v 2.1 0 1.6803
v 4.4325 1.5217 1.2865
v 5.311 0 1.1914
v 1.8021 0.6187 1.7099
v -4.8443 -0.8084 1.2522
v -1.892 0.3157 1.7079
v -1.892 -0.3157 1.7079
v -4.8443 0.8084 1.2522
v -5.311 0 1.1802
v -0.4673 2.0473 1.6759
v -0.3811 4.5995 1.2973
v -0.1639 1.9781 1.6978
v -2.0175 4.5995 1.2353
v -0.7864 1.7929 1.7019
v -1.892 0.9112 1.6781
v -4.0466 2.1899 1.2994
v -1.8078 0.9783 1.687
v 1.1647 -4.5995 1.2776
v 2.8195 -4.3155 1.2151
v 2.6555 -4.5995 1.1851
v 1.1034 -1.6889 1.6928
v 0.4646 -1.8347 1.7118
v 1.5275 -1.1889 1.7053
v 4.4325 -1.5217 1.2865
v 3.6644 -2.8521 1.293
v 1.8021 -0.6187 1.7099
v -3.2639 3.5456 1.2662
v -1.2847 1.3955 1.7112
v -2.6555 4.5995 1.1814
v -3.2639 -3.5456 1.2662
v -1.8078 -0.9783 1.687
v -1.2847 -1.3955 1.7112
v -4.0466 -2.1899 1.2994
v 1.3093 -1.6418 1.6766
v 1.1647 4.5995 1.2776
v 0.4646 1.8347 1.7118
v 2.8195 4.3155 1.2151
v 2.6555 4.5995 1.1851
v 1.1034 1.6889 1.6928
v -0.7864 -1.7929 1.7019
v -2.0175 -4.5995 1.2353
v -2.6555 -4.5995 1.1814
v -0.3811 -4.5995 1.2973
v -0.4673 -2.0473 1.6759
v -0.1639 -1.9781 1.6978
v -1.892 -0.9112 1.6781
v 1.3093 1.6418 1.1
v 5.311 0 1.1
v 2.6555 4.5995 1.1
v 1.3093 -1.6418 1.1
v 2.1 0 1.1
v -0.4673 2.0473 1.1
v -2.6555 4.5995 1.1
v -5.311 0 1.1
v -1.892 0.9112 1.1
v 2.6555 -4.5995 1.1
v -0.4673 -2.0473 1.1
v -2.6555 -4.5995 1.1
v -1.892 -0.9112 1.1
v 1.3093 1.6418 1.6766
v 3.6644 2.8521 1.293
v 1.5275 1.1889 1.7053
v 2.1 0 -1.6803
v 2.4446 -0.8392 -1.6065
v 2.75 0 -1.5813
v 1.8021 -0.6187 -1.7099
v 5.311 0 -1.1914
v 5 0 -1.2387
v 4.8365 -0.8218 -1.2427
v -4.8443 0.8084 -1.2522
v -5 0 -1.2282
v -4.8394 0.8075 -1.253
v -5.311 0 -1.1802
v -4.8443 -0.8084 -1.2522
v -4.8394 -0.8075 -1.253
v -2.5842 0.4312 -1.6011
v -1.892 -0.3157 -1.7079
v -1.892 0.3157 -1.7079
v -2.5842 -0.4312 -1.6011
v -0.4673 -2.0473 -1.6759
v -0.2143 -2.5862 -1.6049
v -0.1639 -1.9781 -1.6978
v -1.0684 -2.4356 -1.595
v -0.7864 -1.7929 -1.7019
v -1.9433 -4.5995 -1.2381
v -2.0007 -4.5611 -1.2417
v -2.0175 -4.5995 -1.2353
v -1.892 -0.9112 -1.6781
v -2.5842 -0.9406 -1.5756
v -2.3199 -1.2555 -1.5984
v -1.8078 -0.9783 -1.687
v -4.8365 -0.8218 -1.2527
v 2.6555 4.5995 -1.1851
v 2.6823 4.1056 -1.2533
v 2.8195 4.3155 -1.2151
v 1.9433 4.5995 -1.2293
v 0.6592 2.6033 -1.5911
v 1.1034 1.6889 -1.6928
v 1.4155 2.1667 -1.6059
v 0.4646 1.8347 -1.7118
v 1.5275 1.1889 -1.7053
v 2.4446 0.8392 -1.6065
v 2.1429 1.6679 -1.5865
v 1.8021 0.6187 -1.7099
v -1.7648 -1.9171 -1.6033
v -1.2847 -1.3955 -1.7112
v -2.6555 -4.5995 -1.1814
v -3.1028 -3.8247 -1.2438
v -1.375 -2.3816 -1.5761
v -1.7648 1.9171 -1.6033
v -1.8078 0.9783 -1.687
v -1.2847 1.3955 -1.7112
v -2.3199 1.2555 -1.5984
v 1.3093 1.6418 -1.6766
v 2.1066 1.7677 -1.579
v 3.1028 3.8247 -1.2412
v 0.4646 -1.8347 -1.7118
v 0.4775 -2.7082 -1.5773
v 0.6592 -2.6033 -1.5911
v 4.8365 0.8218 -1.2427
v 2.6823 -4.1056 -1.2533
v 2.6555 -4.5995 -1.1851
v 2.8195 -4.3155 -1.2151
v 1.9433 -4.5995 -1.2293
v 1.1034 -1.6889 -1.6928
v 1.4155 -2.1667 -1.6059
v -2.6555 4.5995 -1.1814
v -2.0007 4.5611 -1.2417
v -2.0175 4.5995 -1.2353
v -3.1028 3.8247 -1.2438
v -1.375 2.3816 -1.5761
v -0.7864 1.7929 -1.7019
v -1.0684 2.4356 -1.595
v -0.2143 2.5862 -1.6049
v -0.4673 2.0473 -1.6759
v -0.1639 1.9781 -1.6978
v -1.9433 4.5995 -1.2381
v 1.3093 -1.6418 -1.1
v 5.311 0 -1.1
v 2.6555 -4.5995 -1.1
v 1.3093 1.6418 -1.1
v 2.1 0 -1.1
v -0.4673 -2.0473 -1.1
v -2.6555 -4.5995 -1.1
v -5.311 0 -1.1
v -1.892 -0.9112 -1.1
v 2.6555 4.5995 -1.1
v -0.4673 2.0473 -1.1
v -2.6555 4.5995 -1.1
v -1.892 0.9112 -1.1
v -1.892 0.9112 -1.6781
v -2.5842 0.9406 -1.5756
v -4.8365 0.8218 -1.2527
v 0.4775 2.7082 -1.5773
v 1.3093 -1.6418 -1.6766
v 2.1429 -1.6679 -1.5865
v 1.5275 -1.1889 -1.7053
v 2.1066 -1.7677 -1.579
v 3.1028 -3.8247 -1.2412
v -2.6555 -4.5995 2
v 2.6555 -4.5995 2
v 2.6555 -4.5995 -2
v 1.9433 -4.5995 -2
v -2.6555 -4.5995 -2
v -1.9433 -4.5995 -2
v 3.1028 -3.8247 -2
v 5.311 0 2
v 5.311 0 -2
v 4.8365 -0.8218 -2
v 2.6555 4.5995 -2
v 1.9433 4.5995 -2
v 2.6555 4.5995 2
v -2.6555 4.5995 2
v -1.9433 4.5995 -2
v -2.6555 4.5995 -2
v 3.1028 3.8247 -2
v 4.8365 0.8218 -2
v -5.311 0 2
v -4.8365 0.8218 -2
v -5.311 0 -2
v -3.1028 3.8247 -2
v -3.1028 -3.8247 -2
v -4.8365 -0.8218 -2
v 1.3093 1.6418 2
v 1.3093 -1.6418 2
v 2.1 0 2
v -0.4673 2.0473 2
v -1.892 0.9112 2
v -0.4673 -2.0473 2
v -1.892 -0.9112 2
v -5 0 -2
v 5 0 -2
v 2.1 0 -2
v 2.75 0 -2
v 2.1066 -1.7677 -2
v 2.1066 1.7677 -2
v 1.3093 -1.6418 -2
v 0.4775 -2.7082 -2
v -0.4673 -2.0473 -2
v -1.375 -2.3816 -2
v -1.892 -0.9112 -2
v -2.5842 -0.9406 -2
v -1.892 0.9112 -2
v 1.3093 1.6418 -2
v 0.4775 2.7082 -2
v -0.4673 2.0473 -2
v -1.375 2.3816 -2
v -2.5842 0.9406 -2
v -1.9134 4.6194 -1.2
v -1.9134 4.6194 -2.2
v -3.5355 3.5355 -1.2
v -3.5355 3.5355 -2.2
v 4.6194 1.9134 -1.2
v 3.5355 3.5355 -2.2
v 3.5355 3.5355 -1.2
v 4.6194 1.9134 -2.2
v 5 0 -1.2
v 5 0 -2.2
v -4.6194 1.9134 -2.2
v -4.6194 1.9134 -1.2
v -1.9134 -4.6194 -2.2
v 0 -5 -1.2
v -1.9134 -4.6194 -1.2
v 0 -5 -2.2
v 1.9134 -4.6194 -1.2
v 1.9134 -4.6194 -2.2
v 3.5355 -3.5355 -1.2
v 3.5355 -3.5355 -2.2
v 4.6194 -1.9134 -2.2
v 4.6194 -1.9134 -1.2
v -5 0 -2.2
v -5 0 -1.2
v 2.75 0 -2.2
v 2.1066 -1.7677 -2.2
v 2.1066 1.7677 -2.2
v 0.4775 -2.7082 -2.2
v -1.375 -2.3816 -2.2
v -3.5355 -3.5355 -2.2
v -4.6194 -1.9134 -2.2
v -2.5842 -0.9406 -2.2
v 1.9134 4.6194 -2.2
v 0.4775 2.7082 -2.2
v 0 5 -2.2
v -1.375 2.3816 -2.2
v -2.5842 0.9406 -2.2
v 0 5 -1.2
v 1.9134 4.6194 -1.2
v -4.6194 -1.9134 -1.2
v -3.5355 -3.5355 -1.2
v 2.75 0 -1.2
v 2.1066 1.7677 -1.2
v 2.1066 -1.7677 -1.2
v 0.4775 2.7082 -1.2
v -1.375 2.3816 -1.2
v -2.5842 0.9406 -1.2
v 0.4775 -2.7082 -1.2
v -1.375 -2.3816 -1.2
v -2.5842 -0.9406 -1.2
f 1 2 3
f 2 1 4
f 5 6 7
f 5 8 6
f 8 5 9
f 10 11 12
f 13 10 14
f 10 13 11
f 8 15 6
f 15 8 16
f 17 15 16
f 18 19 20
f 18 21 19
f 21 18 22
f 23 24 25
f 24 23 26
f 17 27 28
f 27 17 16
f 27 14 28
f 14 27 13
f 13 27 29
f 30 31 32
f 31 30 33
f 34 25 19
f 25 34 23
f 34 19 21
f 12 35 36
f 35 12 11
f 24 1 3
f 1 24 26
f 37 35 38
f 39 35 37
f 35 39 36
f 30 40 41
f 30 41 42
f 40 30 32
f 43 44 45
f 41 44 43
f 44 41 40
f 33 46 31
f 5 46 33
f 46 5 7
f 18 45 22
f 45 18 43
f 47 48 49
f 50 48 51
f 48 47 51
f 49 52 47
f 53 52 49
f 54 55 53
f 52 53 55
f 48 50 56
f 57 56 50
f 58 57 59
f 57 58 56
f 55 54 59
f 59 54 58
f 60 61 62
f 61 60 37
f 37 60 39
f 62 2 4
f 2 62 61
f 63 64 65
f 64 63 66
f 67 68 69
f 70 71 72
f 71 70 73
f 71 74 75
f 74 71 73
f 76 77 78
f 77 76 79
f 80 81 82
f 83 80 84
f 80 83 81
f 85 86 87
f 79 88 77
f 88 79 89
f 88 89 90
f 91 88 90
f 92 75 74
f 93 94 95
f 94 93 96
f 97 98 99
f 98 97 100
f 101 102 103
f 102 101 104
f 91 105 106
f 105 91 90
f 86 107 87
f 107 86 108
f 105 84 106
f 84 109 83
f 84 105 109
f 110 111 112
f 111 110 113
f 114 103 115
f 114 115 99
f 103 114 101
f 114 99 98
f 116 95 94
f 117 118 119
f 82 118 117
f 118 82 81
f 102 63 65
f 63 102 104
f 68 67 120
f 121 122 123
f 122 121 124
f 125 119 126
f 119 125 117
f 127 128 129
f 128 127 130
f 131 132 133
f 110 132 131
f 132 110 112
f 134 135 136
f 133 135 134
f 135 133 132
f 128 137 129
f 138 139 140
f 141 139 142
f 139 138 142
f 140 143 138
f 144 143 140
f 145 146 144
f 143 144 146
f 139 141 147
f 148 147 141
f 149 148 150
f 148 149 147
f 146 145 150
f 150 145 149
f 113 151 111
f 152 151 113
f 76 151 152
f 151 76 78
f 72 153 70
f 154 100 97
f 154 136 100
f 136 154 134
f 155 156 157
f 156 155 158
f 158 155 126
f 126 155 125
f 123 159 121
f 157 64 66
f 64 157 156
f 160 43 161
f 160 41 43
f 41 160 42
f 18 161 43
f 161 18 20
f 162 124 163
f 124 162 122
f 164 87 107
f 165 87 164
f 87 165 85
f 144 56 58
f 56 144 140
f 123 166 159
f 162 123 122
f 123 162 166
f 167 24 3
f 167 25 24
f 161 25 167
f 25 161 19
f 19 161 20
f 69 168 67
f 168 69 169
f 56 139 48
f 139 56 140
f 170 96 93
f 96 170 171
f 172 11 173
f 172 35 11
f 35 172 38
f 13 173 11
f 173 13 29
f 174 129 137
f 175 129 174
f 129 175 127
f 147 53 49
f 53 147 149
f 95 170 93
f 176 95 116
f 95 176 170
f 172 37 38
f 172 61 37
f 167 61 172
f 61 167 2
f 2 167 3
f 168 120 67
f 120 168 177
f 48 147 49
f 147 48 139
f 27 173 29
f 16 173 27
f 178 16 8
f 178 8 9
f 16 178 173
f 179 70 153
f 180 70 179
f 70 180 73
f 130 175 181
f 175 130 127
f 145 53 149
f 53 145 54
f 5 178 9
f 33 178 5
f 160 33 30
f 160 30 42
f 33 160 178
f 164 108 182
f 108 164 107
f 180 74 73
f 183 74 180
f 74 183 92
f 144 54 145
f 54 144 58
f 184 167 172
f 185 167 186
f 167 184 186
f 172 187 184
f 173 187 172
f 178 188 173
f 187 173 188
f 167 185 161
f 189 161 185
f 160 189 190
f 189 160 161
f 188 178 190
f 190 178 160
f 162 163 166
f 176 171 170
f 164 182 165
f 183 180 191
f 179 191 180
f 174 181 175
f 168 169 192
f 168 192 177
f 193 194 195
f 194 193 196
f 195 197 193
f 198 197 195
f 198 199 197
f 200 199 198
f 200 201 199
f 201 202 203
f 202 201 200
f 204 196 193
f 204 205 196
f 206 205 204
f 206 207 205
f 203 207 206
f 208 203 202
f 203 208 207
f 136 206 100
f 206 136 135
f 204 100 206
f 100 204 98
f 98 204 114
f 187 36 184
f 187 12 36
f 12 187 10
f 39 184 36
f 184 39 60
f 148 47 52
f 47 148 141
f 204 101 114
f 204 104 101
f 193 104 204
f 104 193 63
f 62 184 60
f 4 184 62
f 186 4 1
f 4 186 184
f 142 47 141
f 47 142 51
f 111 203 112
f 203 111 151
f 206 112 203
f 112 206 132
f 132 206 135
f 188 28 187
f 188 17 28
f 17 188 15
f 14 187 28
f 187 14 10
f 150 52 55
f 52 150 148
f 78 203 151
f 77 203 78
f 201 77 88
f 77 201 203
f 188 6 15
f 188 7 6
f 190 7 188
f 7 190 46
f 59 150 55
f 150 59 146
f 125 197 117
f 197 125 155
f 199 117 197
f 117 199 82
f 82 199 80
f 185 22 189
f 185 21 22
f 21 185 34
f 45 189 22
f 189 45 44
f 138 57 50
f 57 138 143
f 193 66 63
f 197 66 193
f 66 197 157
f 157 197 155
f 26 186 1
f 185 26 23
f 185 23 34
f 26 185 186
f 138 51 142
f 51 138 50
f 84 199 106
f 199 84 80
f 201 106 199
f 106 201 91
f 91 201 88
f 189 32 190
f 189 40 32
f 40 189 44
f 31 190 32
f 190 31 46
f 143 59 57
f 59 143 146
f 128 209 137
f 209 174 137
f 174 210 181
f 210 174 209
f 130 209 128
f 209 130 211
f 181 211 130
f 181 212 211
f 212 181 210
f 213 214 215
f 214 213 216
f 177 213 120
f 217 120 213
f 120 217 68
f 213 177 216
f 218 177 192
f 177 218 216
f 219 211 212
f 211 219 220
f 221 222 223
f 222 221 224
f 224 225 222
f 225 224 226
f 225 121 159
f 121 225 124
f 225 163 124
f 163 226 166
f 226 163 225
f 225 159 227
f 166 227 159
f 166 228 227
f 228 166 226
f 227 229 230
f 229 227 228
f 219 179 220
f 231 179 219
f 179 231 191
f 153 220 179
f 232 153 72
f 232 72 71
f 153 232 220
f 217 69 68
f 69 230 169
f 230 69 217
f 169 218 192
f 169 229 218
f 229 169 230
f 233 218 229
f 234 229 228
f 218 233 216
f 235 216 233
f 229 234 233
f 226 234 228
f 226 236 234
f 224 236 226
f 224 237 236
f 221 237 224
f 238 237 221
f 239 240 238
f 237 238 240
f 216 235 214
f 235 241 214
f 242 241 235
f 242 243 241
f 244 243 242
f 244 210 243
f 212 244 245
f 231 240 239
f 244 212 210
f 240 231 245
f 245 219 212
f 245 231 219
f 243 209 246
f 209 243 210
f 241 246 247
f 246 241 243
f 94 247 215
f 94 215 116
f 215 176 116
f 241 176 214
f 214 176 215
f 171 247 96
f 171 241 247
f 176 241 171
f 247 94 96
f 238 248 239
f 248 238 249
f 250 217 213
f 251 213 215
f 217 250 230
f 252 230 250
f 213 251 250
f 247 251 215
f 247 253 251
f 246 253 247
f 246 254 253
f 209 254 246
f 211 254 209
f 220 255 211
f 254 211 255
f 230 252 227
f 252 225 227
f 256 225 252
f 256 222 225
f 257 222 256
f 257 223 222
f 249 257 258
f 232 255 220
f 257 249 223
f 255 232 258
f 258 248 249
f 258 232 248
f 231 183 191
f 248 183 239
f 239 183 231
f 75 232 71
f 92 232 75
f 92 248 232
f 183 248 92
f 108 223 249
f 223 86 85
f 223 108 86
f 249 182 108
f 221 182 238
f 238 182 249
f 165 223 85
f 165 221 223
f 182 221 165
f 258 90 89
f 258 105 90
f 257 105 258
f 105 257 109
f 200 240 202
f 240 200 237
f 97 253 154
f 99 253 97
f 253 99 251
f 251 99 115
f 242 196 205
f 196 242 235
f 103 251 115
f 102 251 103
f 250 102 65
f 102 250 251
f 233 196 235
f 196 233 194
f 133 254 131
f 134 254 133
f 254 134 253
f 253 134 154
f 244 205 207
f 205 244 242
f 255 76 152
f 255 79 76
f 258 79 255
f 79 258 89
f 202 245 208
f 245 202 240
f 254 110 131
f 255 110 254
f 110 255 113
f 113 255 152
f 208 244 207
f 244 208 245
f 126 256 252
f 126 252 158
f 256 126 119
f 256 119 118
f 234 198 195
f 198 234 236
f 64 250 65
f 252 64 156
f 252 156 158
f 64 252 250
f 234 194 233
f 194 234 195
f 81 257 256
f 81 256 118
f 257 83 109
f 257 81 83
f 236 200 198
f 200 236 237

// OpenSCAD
// Parameters
thread_nominal_diameter_mm = 5; //[2.5:10:0.1]
across_flats_mm = 9.2; //[4.6:18.4:0.1]
thickness_mm = 4; //[2:8:0.1]
hole_minor_diameter_mm = 4.2; //[2.1:8.4:0.05]
hole_clearance_diameter_mm = 5.5; //[5:7:0.05]
hole_type = 0; //[0:1:1]
thread_pitch_mm = 0.8; //[0.4:1.6:0.05]
chamfer_mm = 0.3; //[0:1:0.05]
corner_radius_mm = 0; //[0:1:0.05]
eps_mm = 0.6; //[0.2:1.5:0.1]
hex_outer_radius_mm = 5.311; //[2.6555:10.622:0.001]
hole_diameter_mm = 4.2; //[2:7:0.05]
washer_outer_diameter_mm = 10; //[6:20:0.1]
washer_thickness_mm = 1; //[0.5:2:0.1]
washer_hole_diameter_mm = 5.5; //[5:7:0.05]
washer_overlap_mm = 0.8; //[0.3:2:0.1]

// M5 Nut - complete geometry
module nut() {
  color("DimGray") {
    difference() {
      // Hex nut body
      cylinder(r=hex_outer_radius_mm, h=thickness_mm, center=true, $fn=6);
      // Central thread hole
      cylinder(r=hole_diameter_mm/2, h=thickness_mm + 2*eps_mm, center=true);
      // Top and bottom chamfers
      union() {
        translate([0, 0, thickness_mm/2 - (chamfer_mm + eps_mm)/2])
          cylinder(r1=hex_outer_radius_mm + eps_mm, r2=0, h=chamfer_mm + eps_mm, center=true);
        translate([0, 0, -thickness_mm/2 + (chamfer_mm + eps_mm)/2])
          rotate([180, 0, 0])
          cylinder(r1=hex_outer_radius_mm + eps_mm, r2=0, h=chamfer_mm + eps_mm, center=true);
      }
    }
  }
}

// Washer - complete geometry
module washer() {
  color("Silver") {
    difference() {
      // Washer outer
      cylinder(r=washer_outer_diameter_mm/2, h=washer_thickness_mm, center=true);
      // Washer hole
      cylinder(r=washer_hole_diameter_mm/2, h=washer_thickness_mm + 2*eps_mm, center=true);
    }
  }
}

// Nut and Washer Assembly
module nut_and_washer() {
  union() {
    nut();
    translate([0, 0, -thickness_mm/2 - washer_thickness_mm/2 + washer_overlap_mm])
      washer();
  }
}

// Final Assembly
module assembly() {
  nut_and_washer();
}

assembly();
